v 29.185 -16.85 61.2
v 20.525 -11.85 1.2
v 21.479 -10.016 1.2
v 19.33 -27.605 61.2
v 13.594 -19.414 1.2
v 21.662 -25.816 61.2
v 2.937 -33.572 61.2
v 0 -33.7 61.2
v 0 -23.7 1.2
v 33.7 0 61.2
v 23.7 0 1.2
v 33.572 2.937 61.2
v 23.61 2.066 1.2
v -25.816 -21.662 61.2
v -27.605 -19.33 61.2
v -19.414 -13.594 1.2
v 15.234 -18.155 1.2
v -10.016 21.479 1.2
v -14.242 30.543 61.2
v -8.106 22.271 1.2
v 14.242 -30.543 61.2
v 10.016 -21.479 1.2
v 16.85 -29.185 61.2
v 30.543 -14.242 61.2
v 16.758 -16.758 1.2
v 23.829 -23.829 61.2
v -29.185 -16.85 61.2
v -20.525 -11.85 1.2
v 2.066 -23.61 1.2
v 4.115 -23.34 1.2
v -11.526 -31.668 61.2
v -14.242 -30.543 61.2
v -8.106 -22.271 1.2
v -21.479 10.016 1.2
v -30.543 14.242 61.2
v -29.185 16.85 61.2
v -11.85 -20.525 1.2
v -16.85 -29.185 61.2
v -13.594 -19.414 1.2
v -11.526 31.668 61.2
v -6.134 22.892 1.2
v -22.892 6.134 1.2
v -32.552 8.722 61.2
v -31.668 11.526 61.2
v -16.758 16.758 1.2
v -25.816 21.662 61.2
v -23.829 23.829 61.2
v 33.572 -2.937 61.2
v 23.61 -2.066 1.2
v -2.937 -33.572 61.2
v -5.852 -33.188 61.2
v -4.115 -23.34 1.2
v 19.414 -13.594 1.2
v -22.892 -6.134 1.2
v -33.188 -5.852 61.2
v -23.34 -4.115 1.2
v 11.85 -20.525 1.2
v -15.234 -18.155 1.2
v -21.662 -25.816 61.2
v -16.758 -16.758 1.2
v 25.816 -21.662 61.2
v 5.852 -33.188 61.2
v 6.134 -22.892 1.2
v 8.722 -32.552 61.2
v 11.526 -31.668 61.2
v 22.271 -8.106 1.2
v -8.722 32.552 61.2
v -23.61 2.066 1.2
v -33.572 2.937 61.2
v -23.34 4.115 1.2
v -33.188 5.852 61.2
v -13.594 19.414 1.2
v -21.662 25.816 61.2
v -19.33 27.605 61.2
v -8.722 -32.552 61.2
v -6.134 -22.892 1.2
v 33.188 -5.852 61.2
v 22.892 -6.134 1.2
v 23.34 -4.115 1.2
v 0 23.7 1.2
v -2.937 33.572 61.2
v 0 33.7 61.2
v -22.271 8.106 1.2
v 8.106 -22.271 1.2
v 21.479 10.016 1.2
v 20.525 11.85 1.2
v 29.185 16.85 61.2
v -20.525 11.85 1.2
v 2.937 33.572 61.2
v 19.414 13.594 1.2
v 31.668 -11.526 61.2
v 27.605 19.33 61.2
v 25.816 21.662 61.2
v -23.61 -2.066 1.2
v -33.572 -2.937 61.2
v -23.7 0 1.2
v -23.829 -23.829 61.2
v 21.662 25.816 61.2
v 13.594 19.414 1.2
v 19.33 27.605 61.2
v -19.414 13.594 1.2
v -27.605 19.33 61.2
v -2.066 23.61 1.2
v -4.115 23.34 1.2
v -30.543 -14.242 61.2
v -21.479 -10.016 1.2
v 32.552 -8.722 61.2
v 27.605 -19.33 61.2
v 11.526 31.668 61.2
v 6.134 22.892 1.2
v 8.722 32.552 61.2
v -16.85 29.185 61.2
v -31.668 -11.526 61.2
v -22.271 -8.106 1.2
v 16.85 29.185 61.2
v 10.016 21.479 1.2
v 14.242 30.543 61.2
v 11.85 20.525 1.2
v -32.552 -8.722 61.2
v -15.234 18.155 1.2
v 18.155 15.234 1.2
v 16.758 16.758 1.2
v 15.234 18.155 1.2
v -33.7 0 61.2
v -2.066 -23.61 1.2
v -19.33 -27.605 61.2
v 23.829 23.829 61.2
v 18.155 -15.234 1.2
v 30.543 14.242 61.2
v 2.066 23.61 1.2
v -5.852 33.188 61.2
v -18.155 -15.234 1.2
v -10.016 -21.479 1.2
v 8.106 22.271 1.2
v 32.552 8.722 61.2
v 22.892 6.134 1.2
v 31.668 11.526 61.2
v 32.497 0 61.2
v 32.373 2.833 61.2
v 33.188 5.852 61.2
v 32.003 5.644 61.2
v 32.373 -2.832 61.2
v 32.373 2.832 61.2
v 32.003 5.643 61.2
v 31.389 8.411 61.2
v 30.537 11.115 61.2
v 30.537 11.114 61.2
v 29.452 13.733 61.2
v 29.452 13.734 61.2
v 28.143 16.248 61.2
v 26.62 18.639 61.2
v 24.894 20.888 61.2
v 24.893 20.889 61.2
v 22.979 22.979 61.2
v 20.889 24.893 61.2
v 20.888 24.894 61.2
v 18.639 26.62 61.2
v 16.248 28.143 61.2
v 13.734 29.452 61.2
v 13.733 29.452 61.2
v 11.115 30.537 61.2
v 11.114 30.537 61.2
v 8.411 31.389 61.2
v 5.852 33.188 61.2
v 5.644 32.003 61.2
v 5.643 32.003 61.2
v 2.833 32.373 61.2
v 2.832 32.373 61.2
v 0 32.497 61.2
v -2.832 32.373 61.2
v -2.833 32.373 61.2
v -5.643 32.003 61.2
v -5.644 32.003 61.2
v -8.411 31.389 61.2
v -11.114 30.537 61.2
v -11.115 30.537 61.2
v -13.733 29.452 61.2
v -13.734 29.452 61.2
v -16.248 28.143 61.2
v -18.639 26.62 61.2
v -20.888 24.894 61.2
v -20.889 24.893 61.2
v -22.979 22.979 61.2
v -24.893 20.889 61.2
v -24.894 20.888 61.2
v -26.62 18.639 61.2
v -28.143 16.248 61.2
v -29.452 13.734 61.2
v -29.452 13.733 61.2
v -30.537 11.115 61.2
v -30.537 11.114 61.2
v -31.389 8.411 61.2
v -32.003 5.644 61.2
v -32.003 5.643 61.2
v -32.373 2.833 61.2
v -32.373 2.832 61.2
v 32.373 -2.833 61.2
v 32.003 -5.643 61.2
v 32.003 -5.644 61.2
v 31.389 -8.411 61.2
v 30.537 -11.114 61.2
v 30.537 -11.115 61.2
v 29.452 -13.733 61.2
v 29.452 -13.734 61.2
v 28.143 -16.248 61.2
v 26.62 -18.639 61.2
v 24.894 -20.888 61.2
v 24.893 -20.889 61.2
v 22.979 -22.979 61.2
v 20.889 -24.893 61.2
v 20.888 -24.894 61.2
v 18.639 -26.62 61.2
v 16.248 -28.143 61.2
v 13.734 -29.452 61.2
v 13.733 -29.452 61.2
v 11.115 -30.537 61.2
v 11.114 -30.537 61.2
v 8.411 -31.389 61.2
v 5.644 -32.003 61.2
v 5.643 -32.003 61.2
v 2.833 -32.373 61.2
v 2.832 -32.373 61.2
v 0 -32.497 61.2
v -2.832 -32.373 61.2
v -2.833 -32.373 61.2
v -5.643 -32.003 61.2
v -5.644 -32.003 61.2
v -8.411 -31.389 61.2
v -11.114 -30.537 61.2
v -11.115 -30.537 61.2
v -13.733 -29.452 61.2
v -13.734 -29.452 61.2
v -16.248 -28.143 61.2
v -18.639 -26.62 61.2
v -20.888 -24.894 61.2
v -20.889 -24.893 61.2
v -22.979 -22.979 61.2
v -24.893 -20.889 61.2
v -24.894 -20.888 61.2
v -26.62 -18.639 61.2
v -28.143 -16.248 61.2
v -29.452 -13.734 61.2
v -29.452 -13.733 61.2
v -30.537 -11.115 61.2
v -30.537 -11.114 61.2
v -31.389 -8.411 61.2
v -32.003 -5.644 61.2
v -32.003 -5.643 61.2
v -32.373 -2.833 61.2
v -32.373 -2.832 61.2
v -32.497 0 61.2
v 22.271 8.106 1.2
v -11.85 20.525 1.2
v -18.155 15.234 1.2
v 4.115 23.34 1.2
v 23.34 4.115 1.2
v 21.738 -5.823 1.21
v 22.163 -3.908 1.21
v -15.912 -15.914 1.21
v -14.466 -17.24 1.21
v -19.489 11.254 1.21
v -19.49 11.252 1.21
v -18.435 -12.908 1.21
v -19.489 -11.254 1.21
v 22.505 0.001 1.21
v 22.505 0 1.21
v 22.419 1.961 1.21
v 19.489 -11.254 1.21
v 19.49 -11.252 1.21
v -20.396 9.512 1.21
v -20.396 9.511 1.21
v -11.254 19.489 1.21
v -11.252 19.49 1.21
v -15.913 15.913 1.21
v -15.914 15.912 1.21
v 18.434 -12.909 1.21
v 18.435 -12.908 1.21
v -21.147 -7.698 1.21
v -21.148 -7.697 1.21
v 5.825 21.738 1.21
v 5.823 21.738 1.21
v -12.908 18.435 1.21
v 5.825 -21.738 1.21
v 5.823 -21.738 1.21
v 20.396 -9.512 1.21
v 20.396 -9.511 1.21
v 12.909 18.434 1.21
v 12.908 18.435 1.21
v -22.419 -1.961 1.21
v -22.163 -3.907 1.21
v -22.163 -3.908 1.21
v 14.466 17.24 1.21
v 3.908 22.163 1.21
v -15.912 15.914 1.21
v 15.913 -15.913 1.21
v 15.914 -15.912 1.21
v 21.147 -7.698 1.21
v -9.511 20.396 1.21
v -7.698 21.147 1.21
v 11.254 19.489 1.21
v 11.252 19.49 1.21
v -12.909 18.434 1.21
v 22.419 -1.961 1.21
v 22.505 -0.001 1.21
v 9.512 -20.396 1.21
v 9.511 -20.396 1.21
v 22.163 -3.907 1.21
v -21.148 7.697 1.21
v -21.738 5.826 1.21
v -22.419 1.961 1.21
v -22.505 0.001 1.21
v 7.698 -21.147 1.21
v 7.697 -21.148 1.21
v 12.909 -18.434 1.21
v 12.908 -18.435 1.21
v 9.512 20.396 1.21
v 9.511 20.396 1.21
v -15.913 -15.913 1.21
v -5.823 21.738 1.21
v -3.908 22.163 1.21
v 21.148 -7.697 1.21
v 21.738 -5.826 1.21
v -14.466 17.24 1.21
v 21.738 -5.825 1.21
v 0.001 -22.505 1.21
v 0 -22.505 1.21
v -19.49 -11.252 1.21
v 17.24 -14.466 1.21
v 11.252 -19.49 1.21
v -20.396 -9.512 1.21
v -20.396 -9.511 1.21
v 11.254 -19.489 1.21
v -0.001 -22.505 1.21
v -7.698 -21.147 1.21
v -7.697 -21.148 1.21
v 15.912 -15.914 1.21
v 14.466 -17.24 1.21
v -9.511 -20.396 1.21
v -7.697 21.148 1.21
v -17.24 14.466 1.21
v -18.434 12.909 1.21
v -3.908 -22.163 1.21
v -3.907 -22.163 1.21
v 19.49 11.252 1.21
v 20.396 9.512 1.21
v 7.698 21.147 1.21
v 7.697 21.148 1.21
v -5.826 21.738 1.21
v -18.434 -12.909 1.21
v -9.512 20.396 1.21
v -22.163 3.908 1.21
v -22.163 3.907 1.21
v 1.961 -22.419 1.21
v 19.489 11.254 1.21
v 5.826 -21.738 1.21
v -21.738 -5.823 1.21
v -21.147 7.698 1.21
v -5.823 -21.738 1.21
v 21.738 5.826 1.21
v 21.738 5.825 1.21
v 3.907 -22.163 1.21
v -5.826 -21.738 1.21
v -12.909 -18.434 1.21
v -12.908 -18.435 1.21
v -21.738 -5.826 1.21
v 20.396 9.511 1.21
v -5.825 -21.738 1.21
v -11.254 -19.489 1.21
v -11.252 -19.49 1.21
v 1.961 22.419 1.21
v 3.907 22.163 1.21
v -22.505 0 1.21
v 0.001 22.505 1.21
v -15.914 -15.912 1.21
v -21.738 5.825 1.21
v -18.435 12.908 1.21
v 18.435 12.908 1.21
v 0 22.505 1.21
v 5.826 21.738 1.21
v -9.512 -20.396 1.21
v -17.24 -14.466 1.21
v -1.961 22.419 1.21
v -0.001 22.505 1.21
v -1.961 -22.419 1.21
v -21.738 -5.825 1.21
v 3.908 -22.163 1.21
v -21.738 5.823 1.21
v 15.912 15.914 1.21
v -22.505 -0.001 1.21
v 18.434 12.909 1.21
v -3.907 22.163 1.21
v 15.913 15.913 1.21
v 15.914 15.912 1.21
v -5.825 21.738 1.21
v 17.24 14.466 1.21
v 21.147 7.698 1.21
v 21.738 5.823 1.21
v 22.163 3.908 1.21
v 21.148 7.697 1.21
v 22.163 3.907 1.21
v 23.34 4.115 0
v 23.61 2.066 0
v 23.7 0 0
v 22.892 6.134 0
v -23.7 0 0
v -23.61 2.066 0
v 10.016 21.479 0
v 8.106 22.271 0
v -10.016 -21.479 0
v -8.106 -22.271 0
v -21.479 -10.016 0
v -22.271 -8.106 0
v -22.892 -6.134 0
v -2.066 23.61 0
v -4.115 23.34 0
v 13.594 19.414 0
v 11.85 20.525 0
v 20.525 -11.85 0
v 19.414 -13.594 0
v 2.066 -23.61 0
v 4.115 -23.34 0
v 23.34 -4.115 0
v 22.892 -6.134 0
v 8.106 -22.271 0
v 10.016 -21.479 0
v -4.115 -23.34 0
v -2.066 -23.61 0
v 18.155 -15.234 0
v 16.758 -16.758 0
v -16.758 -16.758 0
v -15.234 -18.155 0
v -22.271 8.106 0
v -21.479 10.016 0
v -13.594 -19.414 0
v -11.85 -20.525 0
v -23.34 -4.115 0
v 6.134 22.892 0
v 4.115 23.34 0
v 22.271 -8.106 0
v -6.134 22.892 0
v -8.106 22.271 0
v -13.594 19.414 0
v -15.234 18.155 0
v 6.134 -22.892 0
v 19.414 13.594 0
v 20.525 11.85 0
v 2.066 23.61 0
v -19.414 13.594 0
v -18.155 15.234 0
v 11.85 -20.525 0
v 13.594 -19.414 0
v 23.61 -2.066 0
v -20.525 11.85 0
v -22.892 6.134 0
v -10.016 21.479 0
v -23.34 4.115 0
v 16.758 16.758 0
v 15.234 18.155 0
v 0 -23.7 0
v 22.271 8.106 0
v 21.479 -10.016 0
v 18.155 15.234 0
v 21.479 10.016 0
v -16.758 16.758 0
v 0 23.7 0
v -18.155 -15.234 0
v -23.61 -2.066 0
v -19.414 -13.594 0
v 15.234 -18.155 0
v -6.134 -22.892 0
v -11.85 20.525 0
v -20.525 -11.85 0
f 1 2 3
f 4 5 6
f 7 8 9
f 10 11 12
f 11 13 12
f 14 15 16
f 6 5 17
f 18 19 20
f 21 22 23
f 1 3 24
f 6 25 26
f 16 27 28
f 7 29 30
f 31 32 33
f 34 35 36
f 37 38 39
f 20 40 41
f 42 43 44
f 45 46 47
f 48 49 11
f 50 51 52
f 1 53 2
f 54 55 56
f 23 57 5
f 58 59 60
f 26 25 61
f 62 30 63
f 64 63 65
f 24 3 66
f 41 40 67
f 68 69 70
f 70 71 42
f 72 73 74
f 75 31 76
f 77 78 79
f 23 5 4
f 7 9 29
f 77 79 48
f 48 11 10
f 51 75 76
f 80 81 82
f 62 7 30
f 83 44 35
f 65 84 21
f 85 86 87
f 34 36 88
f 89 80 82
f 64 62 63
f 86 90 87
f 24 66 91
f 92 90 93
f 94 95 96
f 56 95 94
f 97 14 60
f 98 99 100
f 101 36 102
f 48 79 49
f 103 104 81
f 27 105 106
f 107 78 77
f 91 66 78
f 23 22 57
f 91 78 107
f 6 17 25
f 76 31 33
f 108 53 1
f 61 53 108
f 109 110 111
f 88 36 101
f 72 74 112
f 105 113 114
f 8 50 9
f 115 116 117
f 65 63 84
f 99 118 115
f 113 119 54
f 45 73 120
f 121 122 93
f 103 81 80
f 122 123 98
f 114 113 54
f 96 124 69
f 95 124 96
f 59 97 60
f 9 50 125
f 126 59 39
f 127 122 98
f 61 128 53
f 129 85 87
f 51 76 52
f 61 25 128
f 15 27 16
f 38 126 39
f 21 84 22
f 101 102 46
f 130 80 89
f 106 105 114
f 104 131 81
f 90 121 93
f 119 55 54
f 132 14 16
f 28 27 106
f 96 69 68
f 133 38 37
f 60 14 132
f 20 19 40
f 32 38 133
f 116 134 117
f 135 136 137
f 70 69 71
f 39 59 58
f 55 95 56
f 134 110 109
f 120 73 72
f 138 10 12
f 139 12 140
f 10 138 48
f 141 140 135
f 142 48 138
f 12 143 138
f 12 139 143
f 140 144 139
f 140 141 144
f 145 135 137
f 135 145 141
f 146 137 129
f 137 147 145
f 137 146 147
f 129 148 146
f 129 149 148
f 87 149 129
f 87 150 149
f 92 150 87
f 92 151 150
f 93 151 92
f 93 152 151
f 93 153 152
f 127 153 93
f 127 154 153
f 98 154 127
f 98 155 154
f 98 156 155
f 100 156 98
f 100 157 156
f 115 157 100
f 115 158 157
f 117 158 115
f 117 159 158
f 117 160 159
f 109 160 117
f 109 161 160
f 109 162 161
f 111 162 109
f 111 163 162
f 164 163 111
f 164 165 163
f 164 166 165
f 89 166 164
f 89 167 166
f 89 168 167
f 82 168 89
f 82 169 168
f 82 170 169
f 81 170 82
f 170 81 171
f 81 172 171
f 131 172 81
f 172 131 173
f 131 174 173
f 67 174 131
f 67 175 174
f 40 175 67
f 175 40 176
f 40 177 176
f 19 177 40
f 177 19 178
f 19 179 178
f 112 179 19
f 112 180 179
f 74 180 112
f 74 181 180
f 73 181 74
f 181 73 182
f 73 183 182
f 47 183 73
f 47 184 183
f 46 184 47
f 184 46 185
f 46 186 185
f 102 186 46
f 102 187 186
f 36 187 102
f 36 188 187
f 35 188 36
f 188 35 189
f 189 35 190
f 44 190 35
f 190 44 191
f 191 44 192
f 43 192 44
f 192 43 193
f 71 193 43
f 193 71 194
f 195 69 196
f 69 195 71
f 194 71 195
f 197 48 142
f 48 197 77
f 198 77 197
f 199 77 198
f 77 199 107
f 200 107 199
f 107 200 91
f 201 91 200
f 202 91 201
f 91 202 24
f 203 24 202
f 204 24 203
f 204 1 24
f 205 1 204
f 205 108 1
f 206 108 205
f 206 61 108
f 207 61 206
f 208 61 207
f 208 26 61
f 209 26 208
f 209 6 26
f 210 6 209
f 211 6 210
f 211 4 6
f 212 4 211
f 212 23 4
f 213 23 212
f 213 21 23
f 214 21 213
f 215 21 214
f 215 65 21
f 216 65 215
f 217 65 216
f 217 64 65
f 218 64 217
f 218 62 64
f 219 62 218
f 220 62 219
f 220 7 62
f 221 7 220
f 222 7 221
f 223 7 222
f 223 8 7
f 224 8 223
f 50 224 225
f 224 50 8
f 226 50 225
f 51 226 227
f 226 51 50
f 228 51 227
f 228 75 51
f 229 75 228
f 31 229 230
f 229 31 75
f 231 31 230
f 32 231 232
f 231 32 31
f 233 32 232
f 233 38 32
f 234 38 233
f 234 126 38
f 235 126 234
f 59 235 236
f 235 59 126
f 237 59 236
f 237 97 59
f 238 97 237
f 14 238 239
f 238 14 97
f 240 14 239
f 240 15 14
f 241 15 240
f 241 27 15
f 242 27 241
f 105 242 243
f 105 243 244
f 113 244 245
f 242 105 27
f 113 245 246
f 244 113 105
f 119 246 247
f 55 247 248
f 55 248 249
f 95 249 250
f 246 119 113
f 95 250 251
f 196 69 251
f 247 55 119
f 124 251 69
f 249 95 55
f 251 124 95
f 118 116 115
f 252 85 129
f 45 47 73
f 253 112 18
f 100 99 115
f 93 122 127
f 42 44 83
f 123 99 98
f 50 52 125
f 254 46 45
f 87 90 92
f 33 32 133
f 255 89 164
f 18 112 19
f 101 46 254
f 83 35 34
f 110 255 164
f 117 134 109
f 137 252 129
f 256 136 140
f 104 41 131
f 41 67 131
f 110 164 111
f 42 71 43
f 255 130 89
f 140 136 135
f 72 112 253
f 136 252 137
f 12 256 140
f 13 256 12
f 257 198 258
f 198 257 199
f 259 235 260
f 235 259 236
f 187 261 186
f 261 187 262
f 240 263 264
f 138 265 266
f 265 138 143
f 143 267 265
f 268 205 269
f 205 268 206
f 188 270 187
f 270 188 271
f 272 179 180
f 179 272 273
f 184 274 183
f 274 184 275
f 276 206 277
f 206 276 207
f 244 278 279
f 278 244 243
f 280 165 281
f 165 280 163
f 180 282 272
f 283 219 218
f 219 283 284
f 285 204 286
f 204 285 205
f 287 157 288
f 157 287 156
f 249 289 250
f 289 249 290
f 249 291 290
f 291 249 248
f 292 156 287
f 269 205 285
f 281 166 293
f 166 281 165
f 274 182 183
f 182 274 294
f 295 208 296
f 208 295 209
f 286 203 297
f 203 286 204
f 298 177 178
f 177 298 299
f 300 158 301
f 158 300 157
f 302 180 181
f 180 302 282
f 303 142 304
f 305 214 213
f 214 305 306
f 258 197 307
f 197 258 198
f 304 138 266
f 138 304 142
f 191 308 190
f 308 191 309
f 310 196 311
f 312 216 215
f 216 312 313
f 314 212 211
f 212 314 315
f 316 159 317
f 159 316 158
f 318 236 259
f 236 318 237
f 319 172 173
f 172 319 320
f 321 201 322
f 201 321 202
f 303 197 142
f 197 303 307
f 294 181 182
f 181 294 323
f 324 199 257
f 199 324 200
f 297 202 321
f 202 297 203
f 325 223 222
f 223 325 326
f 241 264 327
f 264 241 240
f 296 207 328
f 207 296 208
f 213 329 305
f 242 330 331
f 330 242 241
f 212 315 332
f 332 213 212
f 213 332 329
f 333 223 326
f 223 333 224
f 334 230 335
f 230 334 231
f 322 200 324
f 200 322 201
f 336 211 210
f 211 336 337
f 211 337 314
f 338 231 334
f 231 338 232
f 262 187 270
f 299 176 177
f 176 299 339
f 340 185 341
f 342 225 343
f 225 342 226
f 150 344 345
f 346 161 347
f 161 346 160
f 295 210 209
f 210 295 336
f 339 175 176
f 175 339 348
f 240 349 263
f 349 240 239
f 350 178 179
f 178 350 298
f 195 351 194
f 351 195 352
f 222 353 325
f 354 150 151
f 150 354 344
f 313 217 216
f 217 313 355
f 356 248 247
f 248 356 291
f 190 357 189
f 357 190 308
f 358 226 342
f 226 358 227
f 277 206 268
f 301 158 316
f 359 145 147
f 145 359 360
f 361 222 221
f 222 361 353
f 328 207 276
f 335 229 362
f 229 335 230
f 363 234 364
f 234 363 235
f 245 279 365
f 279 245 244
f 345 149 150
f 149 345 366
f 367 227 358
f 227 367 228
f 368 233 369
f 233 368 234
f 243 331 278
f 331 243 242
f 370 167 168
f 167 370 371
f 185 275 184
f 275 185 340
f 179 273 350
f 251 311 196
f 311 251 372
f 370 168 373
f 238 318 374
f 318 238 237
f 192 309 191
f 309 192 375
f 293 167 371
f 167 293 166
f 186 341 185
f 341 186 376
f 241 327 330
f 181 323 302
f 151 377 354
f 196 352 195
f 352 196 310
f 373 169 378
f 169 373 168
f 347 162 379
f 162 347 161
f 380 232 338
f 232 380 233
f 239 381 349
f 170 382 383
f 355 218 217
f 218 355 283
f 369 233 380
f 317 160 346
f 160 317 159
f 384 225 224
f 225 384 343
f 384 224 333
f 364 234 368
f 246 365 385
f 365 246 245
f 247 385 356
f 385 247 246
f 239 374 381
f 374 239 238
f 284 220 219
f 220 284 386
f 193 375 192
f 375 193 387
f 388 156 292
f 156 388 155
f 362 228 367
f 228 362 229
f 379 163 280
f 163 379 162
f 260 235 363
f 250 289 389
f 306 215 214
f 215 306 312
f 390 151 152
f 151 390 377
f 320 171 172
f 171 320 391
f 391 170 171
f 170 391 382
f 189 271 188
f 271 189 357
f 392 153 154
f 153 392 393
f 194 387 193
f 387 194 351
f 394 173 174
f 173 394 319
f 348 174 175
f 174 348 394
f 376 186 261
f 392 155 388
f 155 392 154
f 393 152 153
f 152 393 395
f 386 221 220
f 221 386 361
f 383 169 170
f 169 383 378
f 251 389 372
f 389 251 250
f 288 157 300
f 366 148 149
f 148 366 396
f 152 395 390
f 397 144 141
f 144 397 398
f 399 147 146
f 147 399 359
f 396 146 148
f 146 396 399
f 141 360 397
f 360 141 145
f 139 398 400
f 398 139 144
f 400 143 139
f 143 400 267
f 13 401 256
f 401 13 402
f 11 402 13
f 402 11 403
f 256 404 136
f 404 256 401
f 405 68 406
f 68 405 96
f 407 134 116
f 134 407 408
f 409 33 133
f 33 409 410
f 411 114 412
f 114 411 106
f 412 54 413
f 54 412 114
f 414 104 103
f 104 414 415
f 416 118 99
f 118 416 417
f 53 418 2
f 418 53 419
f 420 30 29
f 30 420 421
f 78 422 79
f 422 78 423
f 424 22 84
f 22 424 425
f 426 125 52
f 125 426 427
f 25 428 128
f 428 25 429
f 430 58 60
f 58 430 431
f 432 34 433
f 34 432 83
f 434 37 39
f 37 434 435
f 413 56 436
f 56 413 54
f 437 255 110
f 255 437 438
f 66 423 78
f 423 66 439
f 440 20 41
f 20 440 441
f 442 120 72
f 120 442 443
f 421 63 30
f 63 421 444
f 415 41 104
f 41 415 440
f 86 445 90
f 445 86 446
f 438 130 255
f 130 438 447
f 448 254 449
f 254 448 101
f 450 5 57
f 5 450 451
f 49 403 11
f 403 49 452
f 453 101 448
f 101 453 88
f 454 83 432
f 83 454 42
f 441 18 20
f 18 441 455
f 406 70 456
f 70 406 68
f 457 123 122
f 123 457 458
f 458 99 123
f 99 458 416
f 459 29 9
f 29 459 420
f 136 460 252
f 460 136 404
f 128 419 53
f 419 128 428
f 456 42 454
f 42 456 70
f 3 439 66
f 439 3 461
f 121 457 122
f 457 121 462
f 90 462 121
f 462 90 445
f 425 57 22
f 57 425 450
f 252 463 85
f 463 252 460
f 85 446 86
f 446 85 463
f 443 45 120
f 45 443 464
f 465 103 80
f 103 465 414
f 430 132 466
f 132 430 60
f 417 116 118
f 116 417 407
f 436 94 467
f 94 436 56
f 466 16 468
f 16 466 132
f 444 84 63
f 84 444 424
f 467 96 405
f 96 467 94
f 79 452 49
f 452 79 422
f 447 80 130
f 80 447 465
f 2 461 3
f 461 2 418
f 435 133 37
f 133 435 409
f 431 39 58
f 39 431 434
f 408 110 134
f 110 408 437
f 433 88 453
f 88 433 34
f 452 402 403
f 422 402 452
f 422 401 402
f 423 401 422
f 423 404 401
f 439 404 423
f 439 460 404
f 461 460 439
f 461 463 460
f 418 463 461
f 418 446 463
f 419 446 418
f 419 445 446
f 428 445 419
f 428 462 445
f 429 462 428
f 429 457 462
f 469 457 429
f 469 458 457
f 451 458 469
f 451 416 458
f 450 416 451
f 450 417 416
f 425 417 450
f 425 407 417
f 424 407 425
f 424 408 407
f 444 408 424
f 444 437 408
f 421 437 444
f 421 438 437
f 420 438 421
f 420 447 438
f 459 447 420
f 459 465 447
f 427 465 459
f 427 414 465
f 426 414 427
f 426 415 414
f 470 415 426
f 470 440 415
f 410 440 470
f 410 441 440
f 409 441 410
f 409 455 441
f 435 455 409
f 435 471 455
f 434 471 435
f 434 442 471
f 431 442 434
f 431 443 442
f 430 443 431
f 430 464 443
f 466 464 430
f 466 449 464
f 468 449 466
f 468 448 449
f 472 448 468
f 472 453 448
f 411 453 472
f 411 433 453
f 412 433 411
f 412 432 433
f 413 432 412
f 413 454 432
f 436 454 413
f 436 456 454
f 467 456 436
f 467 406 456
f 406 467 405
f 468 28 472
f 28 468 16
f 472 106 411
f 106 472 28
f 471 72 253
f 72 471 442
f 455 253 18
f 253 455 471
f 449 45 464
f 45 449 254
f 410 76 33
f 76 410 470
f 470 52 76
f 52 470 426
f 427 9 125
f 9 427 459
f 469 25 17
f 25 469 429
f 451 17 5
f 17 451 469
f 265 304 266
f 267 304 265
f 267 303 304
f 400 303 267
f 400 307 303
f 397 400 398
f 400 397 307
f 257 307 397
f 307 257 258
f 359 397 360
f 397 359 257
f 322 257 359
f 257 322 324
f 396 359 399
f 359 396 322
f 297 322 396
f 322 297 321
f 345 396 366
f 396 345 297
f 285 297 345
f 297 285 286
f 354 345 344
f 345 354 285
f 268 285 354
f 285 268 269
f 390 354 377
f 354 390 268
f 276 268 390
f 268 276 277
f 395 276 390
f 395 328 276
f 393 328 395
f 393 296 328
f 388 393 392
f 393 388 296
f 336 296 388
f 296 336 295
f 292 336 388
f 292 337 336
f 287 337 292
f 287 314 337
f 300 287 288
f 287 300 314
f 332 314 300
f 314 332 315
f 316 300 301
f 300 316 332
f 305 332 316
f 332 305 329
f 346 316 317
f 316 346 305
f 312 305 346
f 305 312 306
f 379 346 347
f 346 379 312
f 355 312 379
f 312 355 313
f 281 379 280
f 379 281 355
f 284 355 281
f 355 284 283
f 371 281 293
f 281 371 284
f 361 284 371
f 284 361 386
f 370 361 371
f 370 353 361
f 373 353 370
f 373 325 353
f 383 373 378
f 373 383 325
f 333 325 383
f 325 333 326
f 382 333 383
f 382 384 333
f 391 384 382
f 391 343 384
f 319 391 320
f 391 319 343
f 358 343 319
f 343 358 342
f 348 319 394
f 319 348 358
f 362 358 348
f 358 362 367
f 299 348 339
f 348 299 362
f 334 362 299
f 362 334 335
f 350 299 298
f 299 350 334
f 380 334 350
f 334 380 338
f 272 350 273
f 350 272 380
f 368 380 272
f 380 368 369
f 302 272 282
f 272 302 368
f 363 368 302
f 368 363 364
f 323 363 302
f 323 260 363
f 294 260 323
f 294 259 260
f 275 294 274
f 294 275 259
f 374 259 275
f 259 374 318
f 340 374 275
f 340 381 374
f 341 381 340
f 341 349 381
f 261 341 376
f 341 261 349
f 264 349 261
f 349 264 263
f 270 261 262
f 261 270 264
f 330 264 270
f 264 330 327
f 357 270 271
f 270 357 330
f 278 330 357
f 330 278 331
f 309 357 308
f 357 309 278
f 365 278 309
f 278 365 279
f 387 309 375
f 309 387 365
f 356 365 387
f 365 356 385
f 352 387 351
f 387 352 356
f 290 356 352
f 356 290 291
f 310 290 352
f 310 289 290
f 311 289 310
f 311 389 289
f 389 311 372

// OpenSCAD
// -*- mode: SCAD ; c-file-style: "ellemtel" ; coding: utf-8 -*-
//
// kegelstumpfförmiger Becher für Bambusspießechen
//
// © 2018–2019 Roland Sieker <ospalh@gmail.com>
// Licence: CC-BY-SA 4.0

/* [Global] */

// … to preview. You will get all parts as separate STLs when you click “Create Thing”.
part = "s"; // [s: simple mug, k: skewer mug, t: test shape]

// Set this to “render” and click on “Create Thing” when done with the setup.
preview = 1; // [0:render, 1:preview]

/* [Sizes] */

// Hight of the hollow
hight = 60;  // [20:1:150]

// bottom diameter
d_b = 45;  // [20:1:150]

// top diameter
d_t = 65;  // [20:1:150]


/* [Hidden] */

// Done with the customizer

// *******************************************************
// Extra parameters. These can be changed reasonably safely.


w = 1.2;  // Wall width
p = 1.2;  // Bottom, top plate hight
c = 0.4;  // Clearance
angle = 60; // Overhangs much below 60° are a problem for me
w_2 = 0.8;

// *******************************************************
// Some shortcuts. These shouldn’t be changed


module kmirror(maxis=[1, 0, 0])
{
   // Keep *and* mirror an object. Standard is left and right mirroring.
   children();
   mirror(maxis)
   {
      children();
   }
}

tau = 2 * PI;  // π is still wrong. τ = circumference / r

xy_factor = 1/tan(angle);
// To get from a hight to a horizontal width inclined correctly
z_factor = tan(angle);  // The other way around


some_distance = 50;
ms = 0.01;  // Muggeseggele.

// fn for differently sized objects and fs, fa; all for preview or rendering.
pna = 40;
pnb = 15;
pa = 5;
ps = 1;
rna = 180;
rnb = 30;
ra = 2;
rs = 0.25;
function na() = (preview) ? pna : rna;
function nb() = (preview) ? pnb : rnb;
$fs = (preview) ? ps : rs;
$fa = (preview) ? pa : ra;

// *******************************************************
// End setup



// *******************************************************
// Generate the parts

print_part();

if ("t" == part)
{

}

module print_part()
{
   if ("s" == part)
   {
      simple_mug();
   }
   if ("k" == part)
   {
      skewer_mug();
   }
}


// *******************************************************
// Code for the parts themselves

module simple_mug()
{
   cylinder(d=d_b+2*w, h=p+ms);
   difference()
   {
      cone(d_b/2+w, d_t/2+w, 0);
      cone(d_b/2, d_t/2, 2*ms);
   }
}

module skewer_mug()
{
   simple_mug();
   intersection()
   {
      cone(d_b/2+w/2, d_t/2+w/2,ms);
      union()
      {
         translate([-d_t,-w_2/2,0])
         {
            cube([2*d_t,w_2,2*hight]);
         }
         translate([-w_2/2,-d_t,0])
         {
            cube([w_2,2*d_t,2*hight]);
         }
      }
   }
}

module cone(rb, rt, o)
{
   translate([0,0,p-o])
   {
      cylinder(r1=rb, r2=rt, h=hight+2*o);
   }
}
